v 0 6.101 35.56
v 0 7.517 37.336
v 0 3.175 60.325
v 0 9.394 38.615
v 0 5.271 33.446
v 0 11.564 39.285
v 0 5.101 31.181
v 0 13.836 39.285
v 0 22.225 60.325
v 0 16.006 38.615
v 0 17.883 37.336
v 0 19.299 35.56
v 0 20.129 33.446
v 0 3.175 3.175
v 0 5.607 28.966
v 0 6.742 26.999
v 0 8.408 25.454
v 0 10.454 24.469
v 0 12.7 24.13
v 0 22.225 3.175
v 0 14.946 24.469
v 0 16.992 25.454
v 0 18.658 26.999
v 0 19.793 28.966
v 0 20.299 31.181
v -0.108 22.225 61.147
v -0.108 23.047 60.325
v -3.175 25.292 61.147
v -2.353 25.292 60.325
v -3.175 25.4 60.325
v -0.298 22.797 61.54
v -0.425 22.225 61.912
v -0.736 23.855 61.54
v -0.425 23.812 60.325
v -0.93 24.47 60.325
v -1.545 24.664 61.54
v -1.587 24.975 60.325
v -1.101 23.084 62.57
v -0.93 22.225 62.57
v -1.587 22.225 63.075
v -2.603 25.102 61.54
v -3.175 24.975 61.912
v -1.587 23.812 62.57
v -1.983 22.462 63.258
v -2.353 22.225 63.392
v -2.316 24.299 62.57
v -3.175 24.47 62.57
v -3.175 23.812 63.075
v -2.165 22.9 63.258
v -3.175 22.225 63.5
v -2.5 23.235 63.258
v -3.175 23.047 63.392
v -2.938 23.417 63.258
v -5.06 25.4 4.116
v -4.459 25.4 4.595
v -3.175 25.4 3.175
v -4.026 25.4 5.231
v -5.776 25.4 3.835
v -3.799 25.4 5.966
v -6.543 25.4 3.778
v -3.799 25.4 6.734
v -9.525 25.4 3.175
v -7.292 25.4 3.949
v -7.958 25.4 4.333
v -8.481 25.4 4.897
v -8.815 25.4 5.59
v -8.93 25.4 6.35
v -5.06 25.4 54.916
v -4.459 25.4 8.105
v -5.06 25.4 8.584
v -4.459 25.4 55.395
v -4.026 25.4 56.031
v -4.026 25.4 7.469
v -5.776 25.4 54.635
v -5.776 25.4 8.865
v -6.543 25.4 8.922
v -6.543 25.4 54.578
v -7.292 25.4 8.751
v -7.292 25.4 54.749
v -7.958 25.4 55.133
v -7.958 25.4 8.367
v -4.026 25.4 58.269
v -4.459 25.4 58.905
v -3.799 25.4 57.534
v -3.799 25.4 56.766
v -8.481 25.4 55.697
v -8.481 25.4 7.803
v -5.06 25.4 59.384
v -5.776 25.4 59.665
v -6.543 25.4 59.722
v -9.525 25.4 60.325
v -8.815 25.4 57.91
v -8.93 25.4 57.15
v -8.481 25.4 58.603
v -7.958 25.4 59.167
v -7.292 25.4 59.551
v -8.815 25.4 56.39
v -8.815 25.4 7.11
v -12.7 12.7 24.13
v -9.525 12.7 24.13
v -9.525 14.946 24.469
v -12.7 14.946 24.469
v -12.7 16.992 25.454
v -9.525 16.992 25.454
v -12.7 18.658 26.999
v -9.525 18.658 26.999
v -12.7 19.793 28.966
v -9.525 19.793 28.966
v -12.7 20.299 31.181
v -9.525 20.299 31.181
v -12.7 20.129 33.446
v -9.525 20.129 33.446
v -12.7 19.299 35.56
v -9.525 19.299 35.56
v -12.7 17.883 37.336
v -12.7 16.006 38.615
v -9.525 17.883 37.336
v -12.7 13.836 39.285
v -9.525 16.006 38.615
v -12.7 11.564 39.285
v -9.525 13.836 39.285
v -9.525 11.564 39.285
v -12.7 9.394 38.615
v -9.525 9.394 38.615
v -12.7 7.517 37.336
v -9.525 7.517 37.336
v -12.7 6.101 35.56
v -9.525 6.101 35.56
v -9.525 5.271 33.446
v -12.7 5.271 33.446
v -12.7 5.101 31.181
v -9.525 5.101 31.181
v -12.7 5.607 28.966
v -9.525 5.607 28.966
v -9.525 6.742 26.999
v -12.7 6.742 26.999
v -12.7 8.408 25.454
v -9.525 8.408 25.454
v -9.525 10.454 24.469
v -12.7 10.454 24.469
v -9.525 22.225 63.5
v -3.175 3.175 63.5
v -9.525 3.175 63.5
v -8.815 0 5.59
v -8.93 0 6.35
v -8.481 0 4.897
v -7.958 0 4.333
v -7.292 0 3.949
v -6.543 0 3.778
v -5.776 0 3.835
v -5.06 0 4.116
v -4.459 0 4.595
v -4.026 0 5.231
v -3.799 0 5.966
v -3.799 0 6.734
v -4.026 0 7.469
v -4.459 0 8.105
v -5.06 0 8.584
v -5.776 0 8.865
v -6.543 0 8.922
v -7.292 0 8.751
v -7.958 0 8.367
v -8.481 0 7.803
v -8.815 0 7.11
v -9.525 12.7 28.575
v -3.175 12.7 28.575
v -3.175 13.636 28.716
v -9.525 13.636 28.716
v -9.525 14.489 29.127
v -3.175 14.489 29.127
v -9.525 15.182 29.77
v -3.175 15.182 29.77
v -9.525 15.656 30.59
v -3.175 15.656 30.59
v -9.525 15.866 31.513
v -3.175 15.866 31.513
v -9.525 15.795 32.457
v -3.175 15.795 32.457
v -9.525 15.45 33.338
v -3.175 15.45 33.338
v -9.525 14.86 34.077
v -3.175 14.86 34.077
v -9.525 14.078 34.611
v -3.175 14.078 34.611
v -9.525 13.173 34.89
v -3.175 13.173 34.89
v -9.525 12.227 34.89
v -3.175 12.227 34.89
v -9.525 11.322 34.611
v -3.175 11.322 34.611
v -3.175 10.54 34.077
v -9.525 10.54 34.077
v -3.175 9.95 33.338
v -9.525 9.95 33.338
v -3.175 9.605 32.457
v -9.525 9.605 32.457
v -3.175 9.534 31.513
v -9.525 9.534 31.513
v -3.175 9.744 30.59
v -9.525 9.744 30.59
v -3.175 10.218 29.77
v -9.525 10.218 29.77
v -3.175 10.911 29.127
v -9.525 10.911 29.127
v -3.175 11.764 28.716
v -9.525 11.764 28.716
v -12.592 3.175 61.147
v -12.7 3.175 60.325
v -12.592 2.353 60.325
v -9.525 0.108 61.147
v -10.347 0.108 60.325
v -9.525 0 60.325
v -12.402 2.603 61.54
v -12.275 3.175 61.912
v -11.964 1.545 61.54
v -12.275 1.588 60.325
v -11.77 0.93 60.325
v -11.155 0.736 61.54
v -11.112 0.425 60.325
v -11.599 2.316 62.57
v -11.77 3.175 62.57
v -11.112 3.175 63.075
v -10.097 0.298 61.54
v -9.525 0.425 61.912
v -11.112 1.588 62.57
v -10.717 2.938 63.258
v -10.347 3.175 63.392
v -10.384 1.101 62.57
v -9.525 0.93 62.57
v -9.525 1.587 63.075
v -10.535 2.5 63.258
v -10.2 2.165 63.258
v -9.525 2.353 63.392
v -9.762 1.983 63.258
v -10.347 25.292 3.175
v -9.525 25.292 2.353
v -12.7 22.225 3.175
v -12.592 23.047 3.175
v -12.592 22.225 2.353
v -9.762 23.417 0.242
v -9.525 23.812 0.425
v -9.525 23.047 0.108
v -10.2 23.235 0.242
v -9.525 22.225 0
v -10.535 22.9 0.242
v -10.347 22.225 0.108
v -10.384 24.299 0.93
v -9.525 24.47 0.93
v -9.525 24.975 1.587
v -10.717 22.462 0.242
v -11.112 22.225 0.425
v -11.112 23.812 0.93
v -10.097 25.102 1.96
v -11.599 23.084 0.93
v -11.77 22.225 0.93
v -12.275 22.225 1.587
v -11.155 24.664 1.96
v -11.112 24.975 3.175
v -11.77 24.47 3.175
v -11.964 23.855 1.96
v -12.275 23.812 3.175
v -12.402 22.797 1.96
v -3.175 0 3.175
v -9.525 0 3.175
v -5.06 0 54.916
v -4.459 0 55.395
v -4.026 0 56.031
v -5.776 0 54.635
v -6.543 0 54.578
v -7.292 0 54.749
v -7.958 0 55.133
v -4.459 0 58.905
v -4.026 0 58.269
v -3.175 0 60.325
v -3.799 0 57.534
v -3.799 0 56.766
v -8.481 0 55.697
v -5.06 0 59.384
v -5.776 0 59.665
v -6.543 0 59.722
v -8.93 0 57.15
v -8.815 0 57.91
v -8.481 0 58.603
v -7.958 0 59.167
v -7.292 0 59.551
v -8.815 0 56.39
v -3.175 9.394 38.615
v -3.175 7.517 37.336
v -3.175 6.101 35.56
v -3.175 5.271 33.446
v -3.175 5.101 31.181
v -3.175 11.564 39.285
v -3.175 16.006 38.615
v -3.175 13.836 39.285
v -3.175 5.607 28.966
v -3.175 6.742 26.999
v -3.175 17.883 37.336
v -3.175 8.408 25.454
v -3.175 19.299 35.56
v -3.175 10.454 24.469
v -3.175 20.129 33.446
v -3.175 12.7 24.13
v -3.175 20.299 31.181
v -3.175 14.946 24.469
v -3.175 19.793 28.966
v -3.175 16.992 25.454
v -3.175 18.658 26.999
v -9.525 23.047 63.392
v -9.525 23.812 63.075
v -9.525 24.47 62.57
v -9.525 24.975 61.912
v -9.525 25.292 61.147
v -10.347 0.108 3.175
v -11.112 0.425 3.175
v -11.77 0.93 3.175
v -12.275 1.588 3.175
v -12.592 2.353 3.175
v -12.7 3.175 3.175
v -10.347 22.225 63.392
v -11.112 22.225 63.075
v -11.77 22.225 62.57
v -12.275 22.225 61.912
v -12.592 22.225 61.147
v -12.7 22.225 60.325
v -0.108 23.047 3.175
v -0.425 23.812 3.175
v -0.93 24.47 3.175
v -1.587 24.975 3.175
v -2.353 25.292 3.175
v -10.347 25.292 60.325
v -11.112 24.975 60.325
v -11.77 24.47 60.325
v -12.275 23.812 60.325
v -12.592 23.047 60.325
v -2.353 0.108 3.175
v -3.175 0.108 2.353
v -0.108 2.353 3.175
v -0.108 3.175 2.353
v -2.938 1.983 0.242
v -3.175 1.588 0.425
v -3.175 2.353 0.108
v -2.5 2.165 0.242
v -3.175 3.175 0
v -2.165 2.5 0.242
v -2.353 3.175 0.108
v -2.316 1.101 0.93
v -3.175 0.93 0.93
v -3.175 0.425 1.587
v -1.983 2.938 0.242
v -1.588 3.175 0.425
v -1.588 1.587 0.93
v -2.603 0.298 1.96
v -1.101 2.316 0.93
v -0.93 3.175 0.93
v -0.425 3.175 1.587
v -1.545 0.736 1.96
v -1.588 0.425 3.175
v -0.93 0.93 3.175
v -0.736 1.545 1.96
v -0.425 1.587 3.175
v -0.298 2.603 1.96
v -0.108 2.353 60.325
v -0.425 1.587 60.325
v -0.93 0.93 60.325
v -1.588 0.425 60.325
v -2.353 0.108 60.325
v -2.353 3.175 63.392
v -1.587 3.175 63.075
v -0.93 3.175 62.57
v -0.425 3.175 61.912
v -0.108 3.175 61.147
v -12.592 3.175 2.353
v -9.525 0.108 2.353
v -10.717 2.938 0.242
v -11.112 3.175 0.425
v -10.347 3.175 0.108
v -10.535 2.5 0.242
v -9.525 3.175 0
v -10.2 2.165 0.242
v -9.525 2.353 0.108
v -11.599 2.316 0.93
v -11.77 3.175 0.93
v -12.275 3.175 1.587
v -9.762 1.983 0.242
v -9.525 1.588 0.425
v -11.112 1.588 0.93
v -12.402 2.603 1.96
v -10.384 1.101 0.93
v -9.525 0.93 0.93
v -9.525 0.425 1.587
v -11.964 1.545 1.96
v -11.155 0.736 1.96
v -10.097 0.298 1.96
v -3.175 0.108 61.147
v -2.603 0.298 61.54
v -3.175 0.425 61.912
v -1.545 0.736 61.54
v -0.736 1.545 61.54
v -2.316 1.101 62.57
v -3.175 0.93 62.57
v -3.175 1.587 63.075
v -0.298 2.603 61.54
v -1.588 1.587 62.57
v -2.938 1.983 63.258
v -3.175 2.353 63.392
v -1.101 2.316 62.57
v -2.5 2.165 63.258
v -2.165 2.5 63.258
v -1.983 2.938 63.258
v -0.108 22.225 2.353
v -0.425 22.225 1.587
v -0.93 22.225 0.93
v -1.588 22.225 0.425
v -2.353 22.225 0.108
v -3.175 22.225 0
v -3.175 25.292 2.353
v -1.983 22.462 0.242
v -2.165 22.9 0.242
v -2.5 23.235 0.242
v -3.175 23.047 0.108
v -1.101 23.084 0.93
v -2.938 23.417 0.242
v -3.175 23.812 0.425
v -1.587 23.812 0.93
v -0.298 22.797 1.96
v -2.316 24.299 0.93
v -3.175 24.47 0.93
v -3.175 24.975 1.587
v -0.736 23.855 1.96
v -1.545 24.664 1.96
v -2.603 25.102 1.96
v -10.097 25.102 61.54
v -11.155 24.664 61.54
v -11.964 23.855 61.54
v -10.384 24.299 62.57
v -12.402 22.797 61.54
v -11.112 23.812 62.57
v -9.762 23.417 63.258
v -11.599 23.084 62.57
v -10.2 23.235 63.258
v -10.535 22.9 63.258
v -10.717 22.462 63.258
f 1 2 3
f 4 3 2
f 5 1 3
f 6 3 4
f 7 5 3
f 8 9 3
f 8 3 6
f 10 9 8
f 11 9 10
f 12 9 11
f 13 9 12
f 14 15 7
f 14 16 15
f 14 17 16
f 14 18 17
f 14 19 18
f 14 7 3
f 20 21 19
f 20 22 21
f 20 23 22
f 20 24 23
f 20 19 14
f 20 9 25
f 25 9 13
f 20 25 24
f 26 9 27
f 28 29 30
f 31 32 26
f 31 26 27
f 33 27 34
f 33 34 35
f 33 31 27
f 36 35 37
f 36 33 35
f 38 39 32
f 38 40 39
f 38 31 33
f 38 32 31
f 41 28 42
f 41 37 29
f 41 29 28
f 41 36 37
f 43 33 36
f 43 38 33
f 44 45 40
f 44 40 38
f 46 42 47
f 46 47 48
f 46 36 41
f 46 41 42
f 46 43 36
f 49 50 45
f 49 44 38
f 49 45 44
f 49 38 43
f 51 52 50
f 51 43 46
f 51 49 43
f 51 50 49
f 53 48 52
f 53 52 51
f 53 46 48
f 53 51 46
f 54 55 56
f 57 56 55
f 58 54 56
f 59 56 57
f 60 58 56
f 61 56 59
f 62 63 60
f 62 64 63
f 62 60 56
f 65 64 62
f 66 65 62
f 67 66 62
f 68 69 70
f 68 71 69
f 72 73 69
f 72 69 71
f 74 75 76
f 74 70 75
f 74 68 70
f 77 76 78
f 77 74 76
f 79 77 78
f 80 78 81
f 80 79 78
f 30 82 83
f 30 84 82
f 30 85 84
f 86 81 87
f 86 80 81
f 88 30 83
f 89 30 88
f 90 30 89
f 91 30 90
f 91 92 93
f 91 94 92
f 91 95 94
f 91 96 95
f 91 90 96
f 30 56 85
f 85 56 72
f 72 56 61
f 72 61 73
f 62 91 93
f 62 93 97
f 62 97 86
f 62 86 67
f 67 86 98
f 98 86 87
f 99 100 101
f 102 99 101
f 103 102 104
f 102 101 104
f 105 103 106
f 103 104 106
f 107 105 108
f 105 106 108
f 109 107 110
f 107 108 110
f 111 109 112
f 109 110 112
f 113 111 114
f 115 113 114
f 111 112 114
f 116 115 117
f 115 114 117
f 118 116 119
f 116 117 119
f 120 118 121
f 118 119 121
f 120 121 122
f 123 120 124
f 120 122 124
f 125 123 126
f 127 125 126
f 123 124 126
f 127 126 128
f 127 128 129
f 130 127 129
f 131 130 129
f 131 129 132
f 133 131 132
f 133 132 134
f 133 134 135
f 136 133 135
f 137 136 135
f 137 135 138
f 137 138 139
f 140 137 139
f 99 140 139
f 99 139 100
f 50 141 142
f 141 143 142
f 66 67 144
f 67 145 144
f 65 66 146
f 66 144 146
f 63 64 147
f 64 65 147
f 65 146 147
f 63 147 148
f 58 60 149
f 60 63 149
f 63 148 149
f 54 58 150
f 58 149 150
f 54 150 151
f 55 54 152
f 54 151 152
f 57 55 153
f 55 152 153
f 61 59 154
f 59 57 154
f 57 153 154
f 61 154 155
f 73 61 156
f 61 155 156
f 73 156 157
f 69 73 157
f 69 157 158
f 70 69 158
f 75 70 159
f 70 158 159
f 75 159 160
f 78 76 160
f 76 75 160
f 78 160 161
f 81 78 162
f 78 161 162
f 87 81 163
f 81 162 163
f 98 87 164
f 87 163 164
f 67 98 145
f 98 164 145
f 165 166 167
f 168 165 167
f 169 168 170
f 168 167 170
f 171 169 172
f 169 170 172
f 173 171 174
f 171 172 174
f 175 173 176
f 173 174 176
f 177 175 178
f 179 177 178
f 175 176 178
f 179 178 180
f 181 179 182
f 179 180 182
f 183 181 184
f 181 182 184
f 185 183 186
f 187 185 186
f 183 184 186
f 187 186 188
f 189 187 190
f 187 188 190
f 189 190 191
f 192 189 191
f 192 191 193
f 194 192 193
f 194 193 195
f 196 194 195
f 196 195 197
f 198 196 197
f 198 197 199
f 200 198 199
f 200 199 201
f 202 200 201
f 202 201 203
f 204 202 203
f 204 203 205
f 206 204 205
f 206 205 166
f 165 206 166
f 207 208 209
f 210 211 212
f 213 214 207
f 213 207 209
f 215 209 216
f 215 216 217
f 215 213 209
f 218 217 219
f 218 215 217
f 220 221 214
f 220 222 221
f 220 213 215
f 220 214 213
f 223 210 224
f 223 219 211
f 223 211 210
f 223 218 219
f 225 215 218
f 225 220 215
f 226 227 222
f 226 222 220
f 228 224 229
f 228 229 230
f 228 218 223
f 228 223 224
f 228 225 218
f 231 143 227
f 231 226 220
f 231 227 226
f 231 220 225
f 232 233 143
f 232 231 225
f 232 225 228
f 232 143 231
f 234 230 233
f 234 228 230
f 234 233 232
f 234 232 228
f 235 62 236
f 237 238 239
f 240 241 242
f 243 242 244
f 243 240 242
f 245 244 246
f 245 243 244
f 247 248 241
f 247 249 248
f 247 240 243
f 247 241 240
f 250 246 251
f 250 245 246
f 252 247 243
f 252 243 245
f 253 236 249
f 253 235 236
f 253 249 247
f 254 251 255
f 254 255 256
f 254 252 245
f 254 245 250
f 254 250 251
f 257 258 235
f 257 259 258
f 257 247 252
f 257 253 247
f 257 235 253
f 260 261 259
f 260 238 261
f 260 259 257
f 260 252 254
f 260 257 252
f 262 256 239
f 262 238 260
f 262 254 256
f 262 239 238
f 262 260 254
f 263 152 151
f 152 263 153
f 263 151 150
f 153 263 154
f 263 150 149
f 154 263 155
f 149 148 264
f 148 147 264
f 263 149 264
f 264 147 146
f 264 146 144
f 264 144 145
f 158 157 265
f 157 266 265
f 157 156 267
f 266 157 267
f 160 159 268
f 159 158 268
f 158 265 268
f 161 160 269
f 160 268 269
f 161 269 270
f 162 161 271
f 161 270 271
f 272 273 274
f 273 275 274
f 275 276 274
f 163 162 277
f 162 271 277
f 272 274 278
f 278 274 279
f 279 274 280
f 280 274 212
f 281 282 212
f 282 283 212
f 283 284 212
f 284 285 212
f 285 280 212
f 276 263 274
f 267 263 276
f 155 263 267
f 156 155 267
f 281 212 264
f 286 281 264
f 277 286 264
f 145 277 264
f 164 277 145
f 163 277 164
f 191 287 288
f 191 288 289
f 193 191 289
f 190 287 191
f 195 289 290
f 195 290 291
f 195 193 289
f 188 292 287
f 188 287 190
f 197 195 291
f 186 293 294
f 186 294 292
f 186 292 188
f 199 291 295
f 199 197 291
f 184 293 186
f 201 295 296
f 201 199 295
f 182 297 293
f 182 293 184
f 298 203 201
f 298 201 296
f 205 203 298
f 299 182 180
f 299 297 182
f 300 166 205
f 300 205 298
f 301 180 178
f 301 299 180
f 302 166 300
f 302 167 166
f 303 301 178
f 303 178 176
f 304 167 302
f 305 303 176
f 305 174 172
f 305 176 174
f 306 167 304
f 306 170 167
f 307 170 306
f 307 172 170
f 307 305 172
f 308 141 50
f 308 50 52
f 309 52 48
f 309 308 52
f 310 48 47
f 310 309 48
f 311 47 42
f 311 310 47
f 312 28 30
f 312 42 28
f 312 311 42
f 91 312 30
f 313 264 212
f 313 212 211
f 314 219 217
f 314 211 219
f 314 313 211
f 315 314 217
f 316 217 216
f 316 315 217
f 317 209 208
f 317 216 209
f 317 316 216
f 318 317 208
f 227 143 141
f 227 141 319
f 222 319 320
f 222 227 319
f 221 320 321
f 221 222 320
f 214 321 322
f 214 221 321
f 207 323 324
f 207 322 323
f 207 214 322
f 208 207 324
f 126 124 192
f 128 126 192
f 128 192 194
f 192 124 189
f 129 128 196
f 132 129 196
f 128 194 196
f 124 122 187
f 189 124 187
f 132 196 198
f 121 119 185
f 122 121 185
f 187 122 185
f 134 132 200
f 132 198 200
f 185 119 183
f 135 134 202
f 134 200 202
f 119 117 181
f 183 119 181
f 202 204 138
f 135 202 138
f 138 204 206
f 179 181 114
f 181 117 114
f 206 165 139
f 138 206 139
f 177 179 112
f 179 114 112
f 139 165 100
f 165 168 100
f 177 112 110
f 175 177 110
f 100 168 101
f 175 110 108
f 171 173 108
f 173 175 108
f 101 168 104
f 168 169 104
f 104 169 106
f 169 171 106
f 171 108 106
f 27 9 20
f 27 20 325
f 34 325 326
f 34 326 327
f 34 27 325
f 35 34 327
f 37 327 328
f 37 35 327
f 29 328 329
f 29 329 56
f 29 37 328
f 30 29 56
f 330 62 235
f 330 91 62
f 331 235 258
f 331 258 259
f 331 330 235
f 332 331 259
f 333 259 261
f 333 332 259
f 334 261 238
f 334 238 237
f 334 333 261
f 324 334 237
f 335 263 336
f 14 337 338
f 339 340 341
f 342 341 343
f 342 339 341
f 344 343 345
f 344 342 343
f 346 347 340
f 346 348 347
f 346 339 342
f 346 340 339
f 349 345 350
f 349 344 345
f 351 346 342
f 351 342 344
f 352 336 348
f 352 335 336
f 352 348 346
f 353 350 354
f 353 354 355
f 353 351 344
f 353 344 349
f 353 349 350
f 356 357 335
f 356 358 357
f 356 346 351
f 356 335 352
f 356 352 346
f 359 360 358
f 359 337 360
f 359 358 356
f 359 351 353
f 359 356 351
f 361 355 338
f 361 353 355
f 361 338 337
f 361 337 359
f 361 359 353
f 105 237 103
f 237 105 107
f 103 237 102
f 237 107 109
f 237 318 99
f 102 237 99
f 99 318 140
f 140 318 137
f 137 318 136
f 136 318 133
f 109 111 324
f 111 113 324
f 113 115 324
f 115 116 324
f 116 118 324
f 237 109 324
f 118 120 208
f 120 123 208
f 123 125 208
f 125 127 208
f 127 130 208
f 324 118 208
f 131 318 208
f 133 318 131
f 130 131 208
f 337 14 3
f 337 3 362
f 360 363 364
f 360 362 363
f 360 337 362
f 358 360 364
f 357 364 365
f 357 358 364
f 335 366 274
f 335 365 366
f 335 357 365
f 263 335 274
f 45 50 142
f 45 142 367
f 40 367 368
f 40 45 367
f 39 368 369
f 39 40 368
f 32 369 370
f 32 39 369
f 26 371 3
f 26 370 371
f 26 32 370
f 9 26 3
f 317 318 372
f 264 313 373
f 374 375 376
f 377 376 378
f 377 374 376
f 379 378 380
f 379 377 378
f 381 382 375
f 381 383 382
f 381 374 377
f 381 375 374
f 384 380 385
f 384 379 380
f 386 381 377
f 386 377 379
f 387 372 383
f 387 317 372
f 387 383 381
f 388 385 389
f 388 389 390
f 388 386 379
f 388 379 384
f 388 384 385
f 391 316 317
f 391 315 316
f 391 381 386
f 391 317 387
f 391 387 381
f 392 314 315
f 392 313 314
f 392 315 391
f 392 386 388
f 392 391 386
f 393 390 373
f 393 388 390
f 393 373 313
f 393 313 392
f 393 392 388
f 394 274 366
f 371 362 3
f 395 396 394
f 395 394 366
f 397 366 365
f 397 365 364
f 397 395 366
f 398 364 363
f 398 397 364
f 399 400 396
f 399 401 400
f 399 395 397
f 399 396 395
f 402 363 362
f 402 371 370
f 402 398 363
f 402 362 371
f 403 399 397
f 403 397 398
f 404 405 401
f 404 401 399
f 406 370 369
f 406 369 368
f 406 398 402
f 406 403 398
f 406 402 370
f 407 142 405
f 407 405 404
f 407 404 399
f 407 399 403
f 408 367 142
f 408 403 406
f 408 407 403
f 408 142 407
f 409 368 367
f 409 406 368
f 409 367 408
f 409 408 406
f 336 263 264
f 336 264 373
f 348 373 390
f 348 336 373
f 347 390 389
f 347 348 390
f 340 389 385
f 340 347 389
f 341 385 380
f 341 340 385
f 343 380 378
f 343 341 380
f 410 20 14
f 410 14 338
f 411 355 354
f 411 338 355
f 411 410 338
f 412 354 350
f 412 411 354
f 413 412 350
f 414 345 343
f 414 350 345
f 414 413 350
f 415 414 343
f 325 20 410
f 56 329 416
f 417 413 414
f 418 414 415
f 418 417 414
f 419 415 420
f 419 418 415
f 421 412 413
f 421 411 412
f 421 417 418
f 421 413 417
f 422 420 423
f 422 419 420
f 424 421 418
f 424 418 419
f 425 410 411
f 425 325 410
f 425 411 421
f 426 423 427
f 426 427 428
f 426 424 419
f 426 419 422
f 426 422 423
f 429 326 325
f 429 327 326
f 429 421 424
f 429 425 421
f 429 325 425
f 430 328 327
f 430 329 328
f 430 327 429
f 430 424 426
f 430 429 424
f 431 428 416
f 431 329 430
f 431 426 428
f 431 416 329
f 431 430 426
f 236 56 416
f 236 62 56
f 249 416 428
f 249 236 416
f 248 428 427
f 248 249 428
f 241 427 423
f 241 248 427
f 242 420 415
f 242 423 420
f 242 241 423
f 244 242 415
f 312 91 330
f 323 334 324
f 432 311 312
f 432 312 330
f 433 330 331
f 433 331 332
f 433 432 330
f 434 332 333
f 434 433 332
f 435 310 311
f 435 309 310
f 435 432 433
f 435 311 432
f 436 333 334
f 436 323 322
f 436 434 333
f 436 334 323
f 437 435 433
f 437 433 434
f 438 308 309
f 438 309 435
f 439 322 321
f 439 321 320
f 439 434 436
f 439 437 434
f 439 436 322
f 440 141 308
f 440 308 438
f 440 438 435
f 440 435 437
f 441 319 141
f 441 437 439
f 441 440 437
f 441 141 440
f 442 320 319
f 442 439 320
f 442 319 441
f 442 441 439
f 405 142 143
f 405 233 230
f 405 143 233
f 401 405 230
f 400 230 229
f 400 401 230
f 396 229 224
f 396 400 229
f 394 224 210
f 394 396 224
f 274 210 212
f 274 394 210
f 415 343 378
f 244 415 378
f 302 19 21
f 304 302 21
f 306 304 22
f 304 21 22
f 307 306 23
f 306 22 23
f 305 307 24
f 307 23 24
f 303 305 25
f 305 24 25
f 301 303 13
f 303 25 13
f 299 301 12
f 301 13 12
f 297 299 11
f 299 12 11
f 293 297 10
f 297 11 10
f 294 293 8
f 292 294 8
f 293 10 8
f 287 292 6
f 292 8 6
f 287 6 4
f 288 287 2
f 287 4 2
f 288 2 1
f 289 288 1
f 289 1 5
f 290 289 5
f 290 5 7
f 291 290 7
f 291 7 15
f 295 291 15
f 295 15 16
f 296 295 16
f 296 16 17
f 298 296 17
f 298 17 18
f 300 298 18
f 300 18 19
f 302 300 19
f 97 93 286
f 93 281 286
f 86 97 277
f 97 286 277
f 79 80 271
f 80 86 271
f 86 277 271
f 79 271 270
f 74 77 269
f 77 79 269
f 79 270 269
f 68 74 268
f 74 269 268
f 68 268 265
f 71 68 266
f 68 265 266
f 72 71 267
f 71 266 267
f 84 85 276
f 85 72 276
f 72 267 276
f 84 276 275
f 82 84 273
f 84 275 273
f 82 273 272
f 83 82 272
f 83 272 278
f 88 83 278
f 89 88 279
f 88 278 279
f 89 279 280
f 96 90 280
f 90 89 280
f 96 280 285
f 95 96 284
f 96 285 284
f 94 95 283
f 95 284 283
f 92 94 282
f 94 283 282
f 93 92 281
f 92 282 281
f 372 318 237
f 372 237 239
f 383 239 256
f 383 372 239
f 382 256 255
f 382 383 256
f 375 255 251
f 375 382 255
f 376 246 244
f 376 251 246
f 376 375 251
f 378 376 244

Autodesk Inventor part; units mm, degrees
ref_plane "YZ Plane" through (0, 0, 0) normal (1, 0, 0) x (0, 1, 0)
ref_plane "XZ Plane" through (0, 0, 0) normal (0, 1, 0) x (-1, 0, 0)
ref_plane "XY Plane" through (0, 0, 0) normal (0, 0, 1) x (1, 0, 0)
sketch "Sketch1" plane through (0, 0, 0) normal (0, 1, 0) x (-1, 0, 0)
  line L0 (0, 0) -> (12.7, 0)
  line L1 (12.7, 0) -> (12.7, 63.5)
  line L2 (12.7, 63.5) -> (0, 63.5)
  line L3 (0, 63.5) -> (0, 0)
  circle A0 centre (6.35, 6.35) radius 2.5797
  circle A1 centre (6.35, 57.15) radius 2.5797
  circle A2 centre (6.35, 57.15) radius 6.35
  circle A3 centre (6.35, 6.35) radius 6.35
  dimension "d0" = 12.7
  dimension "d2" = 6.35
  dimension "d3" = 6.35
  dimension "d4" = 5.1594
  dimension "d5" = 6.35
  dimension "d6" = 5.1594
  dimension "d7" = 6.35
  dimension "d43" = 50.8
extrude "Extrusion1" add sketch "Sketch1" along normal blind 25.4
sketch "Sketch4" plane through (0, 0, 63.5) normal (1, 0, 0) x (0, 0, -1)
  circle A0 centre (31.75, 12.7) radius 3.175
  line L0 (0, 0) -> (0, 25.4) projected
  line L1 (0, 0) -> (63.5, 0) projected
  circle A1 centre (31.75, 12.7) radius 7.62
  dimension "d30" = 31.75
  dimension "d31" = 12.7
  dimension "d32" = 6.35
  dimension "d37" = 15.24
  dimension "d42" = 63.5
extrude "Extrusion4" cut sketch "Sketch4" against normal blind 12.7 contours A0 | A1
fillet "Fillet1" radius 3.175 4 edges at (-12.7, 25.4, 31.75) (0, 25.4, 31.75) (0, 0, 31.75) (-12.7, 0, 31.75)
fillet "Fillet2" radius 3.175 16 edges at (-0.9299, 24.4701, 63.5) (-6.35, 25.4, 63.5) (-11.7701, 24.4701, 63.5) (-12.7, 12.7, 63.5) (-11.7701, 0.9299, 63.5) (-6.35, 0, 63.5) (-0.9299, 0.9299, 63.5) (0, 12.7, 63.5) (-0.9299, 24.4701, 0) (-6.35, 25.4, 0) (-11.7701, 24.4701, 0) (-12.7, 12.7, 0) (-11.7701, 0.9299, 0) (-6.35, 0, 0) (-0.9299, 0.9299, 0) (0, 12.7, 0)
extrude "Extrusion5" add sketch "Sketch4" against normal blind 9.525
extrude "Extrusion6" cut sketch "Sketch4" against normal blind 3.175
equation "\"d30\" = 0.5 * d42"
properties part number "piston connection"
